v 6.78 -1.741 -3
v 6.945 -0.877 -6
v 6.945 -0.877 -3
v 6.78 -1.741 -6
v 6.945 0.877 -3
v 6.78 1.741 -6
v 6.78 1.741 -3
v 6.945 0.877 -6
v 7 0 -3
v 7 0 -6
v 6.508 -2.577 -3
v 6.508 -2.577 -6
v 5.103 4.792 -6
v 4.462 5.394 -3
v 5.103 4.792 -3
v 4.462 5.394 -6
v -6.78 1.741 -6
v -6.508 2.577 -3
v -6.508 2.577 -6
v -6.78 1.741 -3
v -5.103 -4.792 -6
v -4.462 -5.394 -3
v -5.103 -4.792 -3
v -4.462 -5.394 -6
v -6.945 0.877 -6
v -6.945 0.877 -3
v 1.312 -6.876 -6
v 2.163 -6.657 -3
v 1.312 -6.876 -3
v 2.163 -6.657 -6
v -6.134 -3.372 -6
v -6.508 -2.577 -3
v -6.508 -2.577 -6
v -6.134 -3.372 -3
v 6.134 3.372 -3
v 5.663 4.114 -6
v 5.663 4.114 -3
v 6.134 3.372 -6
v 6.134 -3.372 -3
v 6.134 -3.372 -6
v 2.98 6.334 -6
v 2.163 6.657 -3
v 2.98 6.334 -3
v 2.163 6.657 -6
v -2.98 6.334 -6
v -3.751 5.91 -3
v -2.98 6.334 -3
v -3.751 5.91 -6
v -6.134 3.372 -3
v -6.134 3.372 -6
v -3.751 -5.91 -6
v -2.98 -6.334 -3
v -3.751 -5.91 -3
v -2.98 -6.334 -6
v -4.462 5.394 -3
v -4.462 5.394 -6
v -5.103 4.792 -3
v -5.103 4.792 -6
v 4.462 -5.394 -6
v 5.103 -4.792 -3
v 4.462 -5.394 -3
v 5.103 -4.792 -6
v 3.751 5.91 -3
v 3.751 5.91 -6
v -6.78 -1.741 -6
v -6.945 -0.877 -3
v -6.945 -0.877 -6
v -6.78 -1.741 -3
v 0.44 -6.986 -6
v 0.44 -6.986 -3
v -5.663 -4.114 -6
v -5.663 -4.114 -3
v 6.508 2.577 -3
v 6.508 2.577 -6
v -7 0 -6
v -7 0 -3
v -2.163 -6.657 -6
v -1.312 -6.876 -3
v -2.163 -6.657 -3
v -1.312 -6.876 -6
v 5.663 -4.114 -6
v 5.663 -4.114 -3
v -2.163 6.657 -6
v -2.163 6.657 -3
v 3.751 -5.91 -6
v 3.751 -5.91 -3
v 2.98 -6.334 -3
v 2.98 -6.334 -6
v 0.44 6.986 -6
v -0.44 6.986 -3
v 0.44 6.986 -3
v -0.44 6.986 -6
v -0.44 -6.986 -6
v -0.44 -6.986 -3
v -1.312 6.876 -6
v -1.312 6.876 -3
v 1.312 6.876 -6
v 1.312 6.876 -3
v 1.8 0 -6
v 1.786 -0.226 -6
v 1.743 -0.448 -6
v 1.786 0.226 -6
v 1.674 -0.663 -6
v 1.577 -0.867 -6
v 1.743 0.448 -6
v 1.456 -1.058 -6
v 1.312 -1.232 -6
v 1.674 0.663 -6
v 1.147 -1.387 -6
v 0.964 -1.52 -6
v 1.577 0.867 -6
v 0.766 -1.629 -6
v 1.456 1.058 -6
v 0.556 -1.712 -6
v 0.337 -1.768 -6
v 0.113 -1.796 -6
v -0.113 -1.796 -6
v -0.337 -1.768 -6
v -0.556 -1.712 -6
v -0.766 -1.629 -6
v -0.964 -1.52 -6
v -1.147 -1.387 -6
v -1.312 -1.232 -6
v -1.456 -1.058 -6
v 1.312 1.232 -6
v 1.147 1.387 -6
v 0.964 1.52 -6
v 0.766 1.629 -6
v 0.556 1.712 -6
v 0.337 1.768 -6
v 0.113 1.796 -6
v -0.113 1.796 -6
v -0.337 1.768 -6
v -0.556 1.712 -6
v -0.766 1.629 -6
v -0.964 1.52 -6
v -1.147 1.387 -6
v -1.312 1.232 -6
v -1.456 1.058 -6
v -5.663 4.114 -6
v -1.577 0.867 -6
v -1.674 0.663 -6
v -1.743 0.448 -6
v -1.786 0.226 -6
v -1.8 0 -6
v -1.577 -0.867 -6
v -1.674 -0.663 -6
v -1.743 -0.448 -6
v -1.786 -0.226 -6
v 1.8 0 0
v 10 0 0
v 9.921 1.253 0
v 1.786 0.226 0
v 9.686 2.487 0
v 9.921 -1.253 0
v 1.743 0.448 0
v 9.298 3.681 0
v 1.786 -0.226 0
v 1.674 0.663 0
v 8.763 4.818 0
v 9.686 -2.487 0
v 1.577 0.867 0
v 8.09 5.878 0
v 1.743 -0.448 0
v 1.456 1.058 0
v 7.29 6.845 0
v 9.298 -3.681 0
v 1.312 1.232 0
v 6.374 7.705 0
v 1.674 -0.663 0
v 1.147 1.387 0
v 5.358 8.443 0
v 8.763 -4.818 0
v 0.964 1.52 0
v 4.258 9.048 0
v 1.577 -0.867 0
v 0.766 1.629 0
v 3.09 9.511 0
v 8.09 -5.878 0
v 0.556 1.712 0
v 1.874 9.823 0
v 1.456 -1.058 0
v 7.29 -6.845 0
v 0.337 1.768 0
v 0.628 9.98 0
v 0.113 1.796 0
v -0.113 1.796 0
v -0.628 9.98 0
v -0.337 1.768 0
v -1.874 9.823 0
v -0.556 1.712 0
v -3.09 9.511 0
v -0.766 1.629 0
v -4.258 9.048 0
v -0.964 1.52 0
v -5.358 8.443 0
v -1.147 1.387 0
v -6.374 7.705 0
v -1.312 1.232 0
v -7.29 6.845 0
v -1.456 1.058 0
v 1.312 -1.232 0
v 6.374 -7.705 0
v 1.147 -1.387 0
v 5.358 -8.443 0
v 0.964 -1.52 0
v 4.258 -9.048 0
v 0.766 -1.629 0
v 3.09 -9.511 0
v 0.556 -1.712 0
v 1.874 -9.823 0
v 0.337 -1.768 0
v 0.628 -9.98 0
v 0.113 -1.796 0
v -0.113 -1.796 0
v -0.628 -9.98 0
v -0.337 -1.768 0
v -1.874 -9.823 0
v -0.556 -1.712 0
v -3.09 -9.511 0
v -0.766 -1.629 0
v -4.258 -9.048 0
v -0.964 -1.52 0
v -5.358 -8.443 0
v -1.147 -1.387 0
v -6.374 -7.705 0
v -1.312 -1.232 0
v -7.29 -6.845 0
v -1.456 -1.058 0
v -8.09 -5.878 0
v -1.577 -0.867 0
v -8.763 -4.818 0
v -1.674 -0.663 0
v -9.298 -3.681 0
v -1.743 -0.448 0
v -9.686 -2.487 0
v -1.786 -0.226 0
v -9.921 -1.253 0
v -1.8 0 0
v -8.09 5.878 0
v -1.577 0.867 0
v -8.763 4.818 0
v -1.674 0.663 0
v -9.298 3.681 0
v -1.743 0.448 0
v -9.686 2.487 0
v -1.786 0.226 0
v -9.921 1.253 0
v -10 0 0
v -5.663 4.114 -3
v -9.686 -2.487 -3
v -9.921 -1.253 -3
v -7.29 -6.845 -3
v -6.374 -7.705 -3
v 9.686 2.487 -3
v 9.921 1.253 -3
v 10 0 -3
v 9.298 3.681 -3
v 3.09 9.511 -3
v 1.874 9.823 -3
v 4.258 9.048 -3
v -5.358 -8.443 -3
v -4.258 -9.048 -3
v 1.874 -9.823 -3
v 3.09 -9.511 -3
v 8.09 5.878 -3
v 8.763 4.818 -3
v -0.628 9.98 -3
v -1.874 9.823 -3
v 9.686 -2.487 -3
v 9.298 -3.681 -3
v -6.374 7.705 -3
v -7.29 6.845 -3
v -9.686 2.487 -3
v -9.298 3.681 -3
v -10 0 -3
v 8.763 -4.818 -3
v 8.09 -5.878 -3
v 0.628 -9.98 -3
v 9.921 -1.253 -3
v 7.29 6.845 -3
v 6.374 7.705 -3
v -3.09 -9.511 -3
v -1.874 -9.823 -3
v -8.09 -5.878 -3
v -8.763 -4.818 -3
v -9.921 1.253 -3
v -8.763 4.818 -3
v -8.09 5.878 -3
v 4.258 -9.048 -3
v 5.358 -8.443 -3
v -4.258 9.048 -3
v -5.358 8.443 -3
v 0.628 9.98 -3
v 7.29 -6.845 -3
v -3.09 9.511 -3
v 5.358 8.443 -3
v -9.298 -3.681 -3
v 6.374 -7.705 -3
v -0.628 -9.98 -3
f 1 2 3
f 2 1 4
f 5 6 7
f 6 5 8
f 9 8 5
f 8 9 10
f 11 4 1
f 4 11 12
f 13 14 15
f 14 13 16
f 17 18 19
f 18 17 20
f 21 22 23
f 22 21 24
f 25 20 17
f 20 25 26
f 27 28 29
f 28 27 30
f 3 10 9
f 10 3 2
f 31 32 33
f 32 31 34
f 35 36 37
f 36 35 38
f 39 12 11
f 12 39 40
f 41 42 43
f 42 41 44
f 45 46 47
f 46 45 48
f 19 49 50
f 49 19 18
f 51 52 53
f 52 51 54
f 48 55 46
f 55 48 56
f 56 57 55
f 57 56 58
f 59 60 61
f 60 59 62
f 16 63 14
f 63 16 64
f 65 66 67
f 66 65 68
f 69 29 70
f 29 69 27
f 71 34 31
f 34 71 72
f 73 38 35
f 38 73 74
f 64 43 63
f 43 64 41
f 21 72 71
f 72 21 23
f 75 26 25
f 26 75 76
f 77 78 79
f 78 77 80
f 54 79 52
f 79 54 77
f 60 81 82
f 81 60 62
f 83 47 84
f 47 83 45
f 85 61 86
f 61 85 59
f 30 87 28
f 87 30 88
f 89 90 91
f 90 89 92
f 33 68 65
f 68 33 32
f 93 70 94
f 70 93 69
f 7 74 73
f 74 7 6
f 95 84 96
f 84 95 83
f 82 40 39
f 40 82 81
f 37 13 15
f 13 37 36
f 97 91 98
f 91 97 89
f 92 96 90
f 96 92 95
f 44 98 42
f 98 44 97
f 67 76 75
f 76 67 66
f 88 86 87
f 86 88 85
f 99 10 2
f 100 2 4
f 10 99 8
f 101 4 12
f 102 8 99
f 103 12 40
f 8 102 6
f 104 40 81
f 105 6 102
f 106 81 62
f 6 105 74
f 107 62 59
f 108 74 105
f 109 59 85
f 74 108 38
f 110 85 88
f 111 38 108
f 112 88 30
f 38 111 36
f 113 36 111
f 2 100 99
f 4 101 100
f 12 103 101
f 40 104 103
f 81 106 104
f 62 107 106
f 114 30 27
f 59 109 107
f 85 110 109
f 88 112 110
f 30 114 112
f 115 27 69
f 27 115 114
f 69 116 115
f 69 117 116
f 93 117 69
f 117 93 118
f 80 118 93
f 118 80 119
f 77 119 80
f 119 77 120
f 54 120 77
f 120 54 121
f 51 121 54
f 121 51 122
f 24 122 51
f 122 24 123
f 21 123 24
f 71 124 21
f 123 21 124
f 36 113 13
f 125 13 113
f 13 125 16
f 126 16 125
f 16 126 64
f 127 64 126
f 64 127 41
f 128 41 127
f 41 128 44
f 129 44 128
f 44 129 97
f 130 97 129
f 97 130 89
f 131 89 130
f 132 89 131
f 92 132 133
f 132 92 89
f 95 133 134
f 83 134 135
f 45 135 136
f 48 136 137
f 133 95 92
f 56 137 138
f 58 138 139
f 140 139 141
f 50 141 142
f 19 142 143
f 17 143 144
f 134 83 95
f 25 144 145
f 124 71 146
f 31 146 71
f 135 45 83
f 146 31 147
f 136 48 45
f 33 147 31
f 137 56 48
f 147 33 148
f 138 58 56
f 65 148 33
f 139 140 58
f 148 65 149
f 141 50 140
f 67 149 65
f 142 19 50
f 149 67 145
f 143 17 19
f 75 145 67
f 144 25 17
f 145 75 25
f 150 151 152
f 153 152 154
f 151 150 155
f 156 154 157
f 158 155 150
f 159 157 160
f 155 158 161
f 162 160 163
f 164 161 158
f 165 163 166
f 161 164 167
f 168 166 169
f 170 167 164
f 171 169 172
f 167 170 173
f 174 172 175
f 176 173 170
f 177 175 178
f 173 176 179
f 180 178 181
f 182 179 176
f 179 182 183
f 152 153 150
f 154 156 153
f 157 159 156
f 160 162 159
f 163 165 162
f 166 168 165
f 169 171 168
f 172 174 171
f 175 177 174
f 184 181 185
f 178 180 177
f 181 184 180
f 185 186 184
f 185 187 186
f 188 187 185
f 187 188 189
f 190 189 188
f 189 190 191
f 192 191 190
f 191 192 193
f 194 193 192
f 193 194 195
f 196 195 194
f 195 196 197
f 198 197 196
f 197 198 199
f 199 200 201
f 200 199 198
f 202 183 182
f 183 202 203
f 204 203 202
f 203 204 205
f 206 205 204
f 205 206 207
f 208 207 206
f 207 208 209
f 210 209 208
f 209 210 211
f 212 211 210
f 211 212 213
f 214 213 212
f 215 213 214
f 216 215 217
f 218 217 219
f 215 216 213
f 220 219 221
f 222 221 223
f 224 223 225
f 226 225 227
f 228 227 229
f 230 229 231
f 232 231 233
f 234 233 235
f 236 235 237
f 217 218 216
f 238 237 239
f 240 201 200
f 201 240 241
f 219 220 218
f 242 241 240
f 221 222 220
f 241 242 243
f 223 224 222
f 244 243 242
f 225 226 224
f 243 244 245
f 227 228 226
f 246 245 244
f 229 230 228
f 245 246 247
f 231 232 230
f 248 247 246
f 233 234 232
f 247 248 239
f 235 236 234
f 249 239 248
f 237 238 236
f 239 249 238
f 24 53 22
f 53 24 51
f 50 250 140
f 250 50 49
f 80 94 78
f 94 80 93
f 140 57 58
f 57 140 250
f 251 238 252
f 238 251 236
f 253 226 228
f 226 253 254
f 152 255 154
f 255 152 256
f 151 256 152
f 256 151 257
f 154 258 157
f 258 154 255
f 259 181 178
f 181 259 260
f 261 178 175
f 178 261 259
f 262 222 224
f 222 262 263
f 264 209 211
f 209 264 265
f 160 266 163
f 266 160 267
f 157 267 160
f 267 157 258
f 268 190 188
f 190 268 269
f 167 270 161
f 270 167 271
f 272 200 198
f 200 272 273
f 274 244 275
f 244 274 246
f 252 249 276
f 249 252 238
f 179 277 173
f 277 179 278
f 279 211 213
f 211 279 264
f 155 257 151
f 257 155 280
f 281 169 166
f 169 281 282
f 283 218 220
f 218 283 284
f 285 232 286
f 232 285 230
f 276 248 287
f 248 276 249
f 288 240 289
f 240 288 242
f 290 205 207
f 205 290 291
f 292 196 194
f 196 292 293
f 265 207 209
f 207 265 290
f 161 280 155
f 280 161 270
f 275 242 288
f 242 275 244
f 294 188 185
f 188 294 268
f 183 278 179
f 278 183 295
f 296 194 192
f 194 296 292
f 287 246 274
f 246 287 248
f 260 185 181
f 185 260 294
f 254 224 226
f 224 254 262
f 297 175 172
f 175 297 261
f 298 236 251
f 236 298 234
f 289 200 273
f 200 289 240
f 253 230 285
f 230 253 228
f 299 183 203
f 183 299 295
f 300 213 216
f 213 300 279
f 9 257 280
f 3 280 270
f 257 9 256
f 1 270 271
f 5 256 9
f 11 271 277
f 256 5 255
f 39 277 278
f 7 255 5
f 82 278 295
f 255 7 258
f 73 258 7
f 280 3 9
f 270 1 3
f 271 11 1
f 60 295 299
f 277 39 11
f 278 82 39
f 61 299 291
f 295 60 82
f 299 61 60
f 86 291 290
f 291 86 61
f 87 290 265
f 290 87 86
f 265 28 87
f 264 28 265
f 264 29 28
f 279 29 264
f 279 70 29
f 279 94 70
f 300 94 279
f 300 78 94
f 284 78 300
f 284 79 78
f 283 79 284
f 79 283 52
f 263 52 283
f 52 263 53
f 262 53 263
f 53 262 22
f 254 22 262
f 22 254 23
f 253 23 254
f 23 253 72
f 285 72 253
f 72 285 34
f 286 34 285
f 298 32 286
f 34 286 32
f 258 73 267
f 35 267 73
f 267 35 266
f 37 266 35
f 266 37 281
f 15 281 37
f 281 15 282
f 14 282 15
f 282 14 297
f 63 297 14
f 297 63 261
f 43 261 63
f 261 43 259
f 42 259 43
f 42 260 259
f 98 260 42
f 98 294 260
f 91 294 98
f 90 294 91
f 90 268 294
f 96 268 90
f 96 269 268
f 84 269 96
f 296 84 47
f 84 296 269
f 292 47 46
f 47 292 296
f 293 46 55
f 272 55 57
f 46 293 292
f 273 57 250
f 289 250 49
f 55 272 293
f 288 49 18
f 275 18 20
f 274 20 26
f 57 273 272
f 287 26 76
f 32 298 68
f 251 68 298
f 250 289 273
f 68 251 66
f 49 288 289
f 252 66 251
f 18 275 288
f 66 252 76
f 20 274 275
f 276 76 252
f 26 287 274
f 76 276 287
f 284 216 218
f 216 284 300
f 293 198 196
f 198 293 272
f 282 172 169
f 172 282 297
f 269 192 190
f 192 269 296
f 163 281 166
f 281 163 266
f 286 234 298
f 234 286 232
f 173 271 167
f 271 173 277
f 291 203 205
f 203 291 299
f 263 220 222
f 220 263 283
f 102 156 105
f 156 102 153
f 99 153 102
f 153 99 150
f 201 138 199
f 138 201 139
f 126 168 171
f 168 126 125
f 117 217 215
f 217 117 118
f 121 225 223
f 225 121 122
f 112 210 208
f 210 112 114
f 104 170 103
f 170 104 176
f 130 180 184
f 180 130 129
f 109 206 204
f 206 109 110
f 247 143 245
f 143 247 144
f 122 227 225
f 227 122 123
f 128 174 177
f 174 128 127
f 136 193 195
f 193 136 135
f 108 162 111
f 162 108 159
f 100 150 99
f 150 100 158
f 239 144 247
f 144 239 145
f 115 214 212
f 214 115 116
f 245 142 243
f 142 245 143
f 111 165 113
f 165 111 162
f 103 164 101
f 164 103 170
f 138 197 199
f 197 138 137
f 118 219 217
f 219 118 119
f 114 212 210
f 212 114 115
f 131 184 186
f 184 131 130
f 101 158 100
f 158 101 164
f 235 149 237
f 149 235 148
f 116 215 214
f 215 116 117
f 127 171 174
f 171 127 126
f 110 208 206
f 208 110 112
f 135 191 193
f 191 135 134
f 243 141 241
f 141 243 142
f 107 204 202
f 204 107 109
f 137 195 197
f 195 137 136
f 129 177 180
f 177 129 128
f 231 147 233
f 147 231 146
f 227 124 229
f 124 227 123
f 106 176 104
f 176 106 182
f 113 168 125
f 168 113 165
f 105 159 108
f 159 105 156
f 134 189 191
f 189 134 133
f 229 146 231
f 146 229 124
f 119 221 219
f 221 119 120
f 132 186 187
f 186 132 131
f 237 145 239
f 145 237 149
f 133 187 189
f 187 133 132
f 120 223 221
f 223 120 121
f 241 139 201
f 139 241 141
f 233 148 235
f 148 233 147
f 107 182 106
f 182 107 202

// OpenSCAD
$fn = 50;


difference() {
	union() {
		translate(v = [0, 0, -6.0000000000]) {
			cylinder(h = 6, r = 7.0000000000);
		}
		translate(v = [0, 0, -3.0000000000]) {
			cylinder(h = 3, r = 10.0000000000);
		}
	}
	union() {
		#translate(v = [0, 0, -6]) {
			cylinder(h = 6, r = 1.8000000000);
		}
	}
}
